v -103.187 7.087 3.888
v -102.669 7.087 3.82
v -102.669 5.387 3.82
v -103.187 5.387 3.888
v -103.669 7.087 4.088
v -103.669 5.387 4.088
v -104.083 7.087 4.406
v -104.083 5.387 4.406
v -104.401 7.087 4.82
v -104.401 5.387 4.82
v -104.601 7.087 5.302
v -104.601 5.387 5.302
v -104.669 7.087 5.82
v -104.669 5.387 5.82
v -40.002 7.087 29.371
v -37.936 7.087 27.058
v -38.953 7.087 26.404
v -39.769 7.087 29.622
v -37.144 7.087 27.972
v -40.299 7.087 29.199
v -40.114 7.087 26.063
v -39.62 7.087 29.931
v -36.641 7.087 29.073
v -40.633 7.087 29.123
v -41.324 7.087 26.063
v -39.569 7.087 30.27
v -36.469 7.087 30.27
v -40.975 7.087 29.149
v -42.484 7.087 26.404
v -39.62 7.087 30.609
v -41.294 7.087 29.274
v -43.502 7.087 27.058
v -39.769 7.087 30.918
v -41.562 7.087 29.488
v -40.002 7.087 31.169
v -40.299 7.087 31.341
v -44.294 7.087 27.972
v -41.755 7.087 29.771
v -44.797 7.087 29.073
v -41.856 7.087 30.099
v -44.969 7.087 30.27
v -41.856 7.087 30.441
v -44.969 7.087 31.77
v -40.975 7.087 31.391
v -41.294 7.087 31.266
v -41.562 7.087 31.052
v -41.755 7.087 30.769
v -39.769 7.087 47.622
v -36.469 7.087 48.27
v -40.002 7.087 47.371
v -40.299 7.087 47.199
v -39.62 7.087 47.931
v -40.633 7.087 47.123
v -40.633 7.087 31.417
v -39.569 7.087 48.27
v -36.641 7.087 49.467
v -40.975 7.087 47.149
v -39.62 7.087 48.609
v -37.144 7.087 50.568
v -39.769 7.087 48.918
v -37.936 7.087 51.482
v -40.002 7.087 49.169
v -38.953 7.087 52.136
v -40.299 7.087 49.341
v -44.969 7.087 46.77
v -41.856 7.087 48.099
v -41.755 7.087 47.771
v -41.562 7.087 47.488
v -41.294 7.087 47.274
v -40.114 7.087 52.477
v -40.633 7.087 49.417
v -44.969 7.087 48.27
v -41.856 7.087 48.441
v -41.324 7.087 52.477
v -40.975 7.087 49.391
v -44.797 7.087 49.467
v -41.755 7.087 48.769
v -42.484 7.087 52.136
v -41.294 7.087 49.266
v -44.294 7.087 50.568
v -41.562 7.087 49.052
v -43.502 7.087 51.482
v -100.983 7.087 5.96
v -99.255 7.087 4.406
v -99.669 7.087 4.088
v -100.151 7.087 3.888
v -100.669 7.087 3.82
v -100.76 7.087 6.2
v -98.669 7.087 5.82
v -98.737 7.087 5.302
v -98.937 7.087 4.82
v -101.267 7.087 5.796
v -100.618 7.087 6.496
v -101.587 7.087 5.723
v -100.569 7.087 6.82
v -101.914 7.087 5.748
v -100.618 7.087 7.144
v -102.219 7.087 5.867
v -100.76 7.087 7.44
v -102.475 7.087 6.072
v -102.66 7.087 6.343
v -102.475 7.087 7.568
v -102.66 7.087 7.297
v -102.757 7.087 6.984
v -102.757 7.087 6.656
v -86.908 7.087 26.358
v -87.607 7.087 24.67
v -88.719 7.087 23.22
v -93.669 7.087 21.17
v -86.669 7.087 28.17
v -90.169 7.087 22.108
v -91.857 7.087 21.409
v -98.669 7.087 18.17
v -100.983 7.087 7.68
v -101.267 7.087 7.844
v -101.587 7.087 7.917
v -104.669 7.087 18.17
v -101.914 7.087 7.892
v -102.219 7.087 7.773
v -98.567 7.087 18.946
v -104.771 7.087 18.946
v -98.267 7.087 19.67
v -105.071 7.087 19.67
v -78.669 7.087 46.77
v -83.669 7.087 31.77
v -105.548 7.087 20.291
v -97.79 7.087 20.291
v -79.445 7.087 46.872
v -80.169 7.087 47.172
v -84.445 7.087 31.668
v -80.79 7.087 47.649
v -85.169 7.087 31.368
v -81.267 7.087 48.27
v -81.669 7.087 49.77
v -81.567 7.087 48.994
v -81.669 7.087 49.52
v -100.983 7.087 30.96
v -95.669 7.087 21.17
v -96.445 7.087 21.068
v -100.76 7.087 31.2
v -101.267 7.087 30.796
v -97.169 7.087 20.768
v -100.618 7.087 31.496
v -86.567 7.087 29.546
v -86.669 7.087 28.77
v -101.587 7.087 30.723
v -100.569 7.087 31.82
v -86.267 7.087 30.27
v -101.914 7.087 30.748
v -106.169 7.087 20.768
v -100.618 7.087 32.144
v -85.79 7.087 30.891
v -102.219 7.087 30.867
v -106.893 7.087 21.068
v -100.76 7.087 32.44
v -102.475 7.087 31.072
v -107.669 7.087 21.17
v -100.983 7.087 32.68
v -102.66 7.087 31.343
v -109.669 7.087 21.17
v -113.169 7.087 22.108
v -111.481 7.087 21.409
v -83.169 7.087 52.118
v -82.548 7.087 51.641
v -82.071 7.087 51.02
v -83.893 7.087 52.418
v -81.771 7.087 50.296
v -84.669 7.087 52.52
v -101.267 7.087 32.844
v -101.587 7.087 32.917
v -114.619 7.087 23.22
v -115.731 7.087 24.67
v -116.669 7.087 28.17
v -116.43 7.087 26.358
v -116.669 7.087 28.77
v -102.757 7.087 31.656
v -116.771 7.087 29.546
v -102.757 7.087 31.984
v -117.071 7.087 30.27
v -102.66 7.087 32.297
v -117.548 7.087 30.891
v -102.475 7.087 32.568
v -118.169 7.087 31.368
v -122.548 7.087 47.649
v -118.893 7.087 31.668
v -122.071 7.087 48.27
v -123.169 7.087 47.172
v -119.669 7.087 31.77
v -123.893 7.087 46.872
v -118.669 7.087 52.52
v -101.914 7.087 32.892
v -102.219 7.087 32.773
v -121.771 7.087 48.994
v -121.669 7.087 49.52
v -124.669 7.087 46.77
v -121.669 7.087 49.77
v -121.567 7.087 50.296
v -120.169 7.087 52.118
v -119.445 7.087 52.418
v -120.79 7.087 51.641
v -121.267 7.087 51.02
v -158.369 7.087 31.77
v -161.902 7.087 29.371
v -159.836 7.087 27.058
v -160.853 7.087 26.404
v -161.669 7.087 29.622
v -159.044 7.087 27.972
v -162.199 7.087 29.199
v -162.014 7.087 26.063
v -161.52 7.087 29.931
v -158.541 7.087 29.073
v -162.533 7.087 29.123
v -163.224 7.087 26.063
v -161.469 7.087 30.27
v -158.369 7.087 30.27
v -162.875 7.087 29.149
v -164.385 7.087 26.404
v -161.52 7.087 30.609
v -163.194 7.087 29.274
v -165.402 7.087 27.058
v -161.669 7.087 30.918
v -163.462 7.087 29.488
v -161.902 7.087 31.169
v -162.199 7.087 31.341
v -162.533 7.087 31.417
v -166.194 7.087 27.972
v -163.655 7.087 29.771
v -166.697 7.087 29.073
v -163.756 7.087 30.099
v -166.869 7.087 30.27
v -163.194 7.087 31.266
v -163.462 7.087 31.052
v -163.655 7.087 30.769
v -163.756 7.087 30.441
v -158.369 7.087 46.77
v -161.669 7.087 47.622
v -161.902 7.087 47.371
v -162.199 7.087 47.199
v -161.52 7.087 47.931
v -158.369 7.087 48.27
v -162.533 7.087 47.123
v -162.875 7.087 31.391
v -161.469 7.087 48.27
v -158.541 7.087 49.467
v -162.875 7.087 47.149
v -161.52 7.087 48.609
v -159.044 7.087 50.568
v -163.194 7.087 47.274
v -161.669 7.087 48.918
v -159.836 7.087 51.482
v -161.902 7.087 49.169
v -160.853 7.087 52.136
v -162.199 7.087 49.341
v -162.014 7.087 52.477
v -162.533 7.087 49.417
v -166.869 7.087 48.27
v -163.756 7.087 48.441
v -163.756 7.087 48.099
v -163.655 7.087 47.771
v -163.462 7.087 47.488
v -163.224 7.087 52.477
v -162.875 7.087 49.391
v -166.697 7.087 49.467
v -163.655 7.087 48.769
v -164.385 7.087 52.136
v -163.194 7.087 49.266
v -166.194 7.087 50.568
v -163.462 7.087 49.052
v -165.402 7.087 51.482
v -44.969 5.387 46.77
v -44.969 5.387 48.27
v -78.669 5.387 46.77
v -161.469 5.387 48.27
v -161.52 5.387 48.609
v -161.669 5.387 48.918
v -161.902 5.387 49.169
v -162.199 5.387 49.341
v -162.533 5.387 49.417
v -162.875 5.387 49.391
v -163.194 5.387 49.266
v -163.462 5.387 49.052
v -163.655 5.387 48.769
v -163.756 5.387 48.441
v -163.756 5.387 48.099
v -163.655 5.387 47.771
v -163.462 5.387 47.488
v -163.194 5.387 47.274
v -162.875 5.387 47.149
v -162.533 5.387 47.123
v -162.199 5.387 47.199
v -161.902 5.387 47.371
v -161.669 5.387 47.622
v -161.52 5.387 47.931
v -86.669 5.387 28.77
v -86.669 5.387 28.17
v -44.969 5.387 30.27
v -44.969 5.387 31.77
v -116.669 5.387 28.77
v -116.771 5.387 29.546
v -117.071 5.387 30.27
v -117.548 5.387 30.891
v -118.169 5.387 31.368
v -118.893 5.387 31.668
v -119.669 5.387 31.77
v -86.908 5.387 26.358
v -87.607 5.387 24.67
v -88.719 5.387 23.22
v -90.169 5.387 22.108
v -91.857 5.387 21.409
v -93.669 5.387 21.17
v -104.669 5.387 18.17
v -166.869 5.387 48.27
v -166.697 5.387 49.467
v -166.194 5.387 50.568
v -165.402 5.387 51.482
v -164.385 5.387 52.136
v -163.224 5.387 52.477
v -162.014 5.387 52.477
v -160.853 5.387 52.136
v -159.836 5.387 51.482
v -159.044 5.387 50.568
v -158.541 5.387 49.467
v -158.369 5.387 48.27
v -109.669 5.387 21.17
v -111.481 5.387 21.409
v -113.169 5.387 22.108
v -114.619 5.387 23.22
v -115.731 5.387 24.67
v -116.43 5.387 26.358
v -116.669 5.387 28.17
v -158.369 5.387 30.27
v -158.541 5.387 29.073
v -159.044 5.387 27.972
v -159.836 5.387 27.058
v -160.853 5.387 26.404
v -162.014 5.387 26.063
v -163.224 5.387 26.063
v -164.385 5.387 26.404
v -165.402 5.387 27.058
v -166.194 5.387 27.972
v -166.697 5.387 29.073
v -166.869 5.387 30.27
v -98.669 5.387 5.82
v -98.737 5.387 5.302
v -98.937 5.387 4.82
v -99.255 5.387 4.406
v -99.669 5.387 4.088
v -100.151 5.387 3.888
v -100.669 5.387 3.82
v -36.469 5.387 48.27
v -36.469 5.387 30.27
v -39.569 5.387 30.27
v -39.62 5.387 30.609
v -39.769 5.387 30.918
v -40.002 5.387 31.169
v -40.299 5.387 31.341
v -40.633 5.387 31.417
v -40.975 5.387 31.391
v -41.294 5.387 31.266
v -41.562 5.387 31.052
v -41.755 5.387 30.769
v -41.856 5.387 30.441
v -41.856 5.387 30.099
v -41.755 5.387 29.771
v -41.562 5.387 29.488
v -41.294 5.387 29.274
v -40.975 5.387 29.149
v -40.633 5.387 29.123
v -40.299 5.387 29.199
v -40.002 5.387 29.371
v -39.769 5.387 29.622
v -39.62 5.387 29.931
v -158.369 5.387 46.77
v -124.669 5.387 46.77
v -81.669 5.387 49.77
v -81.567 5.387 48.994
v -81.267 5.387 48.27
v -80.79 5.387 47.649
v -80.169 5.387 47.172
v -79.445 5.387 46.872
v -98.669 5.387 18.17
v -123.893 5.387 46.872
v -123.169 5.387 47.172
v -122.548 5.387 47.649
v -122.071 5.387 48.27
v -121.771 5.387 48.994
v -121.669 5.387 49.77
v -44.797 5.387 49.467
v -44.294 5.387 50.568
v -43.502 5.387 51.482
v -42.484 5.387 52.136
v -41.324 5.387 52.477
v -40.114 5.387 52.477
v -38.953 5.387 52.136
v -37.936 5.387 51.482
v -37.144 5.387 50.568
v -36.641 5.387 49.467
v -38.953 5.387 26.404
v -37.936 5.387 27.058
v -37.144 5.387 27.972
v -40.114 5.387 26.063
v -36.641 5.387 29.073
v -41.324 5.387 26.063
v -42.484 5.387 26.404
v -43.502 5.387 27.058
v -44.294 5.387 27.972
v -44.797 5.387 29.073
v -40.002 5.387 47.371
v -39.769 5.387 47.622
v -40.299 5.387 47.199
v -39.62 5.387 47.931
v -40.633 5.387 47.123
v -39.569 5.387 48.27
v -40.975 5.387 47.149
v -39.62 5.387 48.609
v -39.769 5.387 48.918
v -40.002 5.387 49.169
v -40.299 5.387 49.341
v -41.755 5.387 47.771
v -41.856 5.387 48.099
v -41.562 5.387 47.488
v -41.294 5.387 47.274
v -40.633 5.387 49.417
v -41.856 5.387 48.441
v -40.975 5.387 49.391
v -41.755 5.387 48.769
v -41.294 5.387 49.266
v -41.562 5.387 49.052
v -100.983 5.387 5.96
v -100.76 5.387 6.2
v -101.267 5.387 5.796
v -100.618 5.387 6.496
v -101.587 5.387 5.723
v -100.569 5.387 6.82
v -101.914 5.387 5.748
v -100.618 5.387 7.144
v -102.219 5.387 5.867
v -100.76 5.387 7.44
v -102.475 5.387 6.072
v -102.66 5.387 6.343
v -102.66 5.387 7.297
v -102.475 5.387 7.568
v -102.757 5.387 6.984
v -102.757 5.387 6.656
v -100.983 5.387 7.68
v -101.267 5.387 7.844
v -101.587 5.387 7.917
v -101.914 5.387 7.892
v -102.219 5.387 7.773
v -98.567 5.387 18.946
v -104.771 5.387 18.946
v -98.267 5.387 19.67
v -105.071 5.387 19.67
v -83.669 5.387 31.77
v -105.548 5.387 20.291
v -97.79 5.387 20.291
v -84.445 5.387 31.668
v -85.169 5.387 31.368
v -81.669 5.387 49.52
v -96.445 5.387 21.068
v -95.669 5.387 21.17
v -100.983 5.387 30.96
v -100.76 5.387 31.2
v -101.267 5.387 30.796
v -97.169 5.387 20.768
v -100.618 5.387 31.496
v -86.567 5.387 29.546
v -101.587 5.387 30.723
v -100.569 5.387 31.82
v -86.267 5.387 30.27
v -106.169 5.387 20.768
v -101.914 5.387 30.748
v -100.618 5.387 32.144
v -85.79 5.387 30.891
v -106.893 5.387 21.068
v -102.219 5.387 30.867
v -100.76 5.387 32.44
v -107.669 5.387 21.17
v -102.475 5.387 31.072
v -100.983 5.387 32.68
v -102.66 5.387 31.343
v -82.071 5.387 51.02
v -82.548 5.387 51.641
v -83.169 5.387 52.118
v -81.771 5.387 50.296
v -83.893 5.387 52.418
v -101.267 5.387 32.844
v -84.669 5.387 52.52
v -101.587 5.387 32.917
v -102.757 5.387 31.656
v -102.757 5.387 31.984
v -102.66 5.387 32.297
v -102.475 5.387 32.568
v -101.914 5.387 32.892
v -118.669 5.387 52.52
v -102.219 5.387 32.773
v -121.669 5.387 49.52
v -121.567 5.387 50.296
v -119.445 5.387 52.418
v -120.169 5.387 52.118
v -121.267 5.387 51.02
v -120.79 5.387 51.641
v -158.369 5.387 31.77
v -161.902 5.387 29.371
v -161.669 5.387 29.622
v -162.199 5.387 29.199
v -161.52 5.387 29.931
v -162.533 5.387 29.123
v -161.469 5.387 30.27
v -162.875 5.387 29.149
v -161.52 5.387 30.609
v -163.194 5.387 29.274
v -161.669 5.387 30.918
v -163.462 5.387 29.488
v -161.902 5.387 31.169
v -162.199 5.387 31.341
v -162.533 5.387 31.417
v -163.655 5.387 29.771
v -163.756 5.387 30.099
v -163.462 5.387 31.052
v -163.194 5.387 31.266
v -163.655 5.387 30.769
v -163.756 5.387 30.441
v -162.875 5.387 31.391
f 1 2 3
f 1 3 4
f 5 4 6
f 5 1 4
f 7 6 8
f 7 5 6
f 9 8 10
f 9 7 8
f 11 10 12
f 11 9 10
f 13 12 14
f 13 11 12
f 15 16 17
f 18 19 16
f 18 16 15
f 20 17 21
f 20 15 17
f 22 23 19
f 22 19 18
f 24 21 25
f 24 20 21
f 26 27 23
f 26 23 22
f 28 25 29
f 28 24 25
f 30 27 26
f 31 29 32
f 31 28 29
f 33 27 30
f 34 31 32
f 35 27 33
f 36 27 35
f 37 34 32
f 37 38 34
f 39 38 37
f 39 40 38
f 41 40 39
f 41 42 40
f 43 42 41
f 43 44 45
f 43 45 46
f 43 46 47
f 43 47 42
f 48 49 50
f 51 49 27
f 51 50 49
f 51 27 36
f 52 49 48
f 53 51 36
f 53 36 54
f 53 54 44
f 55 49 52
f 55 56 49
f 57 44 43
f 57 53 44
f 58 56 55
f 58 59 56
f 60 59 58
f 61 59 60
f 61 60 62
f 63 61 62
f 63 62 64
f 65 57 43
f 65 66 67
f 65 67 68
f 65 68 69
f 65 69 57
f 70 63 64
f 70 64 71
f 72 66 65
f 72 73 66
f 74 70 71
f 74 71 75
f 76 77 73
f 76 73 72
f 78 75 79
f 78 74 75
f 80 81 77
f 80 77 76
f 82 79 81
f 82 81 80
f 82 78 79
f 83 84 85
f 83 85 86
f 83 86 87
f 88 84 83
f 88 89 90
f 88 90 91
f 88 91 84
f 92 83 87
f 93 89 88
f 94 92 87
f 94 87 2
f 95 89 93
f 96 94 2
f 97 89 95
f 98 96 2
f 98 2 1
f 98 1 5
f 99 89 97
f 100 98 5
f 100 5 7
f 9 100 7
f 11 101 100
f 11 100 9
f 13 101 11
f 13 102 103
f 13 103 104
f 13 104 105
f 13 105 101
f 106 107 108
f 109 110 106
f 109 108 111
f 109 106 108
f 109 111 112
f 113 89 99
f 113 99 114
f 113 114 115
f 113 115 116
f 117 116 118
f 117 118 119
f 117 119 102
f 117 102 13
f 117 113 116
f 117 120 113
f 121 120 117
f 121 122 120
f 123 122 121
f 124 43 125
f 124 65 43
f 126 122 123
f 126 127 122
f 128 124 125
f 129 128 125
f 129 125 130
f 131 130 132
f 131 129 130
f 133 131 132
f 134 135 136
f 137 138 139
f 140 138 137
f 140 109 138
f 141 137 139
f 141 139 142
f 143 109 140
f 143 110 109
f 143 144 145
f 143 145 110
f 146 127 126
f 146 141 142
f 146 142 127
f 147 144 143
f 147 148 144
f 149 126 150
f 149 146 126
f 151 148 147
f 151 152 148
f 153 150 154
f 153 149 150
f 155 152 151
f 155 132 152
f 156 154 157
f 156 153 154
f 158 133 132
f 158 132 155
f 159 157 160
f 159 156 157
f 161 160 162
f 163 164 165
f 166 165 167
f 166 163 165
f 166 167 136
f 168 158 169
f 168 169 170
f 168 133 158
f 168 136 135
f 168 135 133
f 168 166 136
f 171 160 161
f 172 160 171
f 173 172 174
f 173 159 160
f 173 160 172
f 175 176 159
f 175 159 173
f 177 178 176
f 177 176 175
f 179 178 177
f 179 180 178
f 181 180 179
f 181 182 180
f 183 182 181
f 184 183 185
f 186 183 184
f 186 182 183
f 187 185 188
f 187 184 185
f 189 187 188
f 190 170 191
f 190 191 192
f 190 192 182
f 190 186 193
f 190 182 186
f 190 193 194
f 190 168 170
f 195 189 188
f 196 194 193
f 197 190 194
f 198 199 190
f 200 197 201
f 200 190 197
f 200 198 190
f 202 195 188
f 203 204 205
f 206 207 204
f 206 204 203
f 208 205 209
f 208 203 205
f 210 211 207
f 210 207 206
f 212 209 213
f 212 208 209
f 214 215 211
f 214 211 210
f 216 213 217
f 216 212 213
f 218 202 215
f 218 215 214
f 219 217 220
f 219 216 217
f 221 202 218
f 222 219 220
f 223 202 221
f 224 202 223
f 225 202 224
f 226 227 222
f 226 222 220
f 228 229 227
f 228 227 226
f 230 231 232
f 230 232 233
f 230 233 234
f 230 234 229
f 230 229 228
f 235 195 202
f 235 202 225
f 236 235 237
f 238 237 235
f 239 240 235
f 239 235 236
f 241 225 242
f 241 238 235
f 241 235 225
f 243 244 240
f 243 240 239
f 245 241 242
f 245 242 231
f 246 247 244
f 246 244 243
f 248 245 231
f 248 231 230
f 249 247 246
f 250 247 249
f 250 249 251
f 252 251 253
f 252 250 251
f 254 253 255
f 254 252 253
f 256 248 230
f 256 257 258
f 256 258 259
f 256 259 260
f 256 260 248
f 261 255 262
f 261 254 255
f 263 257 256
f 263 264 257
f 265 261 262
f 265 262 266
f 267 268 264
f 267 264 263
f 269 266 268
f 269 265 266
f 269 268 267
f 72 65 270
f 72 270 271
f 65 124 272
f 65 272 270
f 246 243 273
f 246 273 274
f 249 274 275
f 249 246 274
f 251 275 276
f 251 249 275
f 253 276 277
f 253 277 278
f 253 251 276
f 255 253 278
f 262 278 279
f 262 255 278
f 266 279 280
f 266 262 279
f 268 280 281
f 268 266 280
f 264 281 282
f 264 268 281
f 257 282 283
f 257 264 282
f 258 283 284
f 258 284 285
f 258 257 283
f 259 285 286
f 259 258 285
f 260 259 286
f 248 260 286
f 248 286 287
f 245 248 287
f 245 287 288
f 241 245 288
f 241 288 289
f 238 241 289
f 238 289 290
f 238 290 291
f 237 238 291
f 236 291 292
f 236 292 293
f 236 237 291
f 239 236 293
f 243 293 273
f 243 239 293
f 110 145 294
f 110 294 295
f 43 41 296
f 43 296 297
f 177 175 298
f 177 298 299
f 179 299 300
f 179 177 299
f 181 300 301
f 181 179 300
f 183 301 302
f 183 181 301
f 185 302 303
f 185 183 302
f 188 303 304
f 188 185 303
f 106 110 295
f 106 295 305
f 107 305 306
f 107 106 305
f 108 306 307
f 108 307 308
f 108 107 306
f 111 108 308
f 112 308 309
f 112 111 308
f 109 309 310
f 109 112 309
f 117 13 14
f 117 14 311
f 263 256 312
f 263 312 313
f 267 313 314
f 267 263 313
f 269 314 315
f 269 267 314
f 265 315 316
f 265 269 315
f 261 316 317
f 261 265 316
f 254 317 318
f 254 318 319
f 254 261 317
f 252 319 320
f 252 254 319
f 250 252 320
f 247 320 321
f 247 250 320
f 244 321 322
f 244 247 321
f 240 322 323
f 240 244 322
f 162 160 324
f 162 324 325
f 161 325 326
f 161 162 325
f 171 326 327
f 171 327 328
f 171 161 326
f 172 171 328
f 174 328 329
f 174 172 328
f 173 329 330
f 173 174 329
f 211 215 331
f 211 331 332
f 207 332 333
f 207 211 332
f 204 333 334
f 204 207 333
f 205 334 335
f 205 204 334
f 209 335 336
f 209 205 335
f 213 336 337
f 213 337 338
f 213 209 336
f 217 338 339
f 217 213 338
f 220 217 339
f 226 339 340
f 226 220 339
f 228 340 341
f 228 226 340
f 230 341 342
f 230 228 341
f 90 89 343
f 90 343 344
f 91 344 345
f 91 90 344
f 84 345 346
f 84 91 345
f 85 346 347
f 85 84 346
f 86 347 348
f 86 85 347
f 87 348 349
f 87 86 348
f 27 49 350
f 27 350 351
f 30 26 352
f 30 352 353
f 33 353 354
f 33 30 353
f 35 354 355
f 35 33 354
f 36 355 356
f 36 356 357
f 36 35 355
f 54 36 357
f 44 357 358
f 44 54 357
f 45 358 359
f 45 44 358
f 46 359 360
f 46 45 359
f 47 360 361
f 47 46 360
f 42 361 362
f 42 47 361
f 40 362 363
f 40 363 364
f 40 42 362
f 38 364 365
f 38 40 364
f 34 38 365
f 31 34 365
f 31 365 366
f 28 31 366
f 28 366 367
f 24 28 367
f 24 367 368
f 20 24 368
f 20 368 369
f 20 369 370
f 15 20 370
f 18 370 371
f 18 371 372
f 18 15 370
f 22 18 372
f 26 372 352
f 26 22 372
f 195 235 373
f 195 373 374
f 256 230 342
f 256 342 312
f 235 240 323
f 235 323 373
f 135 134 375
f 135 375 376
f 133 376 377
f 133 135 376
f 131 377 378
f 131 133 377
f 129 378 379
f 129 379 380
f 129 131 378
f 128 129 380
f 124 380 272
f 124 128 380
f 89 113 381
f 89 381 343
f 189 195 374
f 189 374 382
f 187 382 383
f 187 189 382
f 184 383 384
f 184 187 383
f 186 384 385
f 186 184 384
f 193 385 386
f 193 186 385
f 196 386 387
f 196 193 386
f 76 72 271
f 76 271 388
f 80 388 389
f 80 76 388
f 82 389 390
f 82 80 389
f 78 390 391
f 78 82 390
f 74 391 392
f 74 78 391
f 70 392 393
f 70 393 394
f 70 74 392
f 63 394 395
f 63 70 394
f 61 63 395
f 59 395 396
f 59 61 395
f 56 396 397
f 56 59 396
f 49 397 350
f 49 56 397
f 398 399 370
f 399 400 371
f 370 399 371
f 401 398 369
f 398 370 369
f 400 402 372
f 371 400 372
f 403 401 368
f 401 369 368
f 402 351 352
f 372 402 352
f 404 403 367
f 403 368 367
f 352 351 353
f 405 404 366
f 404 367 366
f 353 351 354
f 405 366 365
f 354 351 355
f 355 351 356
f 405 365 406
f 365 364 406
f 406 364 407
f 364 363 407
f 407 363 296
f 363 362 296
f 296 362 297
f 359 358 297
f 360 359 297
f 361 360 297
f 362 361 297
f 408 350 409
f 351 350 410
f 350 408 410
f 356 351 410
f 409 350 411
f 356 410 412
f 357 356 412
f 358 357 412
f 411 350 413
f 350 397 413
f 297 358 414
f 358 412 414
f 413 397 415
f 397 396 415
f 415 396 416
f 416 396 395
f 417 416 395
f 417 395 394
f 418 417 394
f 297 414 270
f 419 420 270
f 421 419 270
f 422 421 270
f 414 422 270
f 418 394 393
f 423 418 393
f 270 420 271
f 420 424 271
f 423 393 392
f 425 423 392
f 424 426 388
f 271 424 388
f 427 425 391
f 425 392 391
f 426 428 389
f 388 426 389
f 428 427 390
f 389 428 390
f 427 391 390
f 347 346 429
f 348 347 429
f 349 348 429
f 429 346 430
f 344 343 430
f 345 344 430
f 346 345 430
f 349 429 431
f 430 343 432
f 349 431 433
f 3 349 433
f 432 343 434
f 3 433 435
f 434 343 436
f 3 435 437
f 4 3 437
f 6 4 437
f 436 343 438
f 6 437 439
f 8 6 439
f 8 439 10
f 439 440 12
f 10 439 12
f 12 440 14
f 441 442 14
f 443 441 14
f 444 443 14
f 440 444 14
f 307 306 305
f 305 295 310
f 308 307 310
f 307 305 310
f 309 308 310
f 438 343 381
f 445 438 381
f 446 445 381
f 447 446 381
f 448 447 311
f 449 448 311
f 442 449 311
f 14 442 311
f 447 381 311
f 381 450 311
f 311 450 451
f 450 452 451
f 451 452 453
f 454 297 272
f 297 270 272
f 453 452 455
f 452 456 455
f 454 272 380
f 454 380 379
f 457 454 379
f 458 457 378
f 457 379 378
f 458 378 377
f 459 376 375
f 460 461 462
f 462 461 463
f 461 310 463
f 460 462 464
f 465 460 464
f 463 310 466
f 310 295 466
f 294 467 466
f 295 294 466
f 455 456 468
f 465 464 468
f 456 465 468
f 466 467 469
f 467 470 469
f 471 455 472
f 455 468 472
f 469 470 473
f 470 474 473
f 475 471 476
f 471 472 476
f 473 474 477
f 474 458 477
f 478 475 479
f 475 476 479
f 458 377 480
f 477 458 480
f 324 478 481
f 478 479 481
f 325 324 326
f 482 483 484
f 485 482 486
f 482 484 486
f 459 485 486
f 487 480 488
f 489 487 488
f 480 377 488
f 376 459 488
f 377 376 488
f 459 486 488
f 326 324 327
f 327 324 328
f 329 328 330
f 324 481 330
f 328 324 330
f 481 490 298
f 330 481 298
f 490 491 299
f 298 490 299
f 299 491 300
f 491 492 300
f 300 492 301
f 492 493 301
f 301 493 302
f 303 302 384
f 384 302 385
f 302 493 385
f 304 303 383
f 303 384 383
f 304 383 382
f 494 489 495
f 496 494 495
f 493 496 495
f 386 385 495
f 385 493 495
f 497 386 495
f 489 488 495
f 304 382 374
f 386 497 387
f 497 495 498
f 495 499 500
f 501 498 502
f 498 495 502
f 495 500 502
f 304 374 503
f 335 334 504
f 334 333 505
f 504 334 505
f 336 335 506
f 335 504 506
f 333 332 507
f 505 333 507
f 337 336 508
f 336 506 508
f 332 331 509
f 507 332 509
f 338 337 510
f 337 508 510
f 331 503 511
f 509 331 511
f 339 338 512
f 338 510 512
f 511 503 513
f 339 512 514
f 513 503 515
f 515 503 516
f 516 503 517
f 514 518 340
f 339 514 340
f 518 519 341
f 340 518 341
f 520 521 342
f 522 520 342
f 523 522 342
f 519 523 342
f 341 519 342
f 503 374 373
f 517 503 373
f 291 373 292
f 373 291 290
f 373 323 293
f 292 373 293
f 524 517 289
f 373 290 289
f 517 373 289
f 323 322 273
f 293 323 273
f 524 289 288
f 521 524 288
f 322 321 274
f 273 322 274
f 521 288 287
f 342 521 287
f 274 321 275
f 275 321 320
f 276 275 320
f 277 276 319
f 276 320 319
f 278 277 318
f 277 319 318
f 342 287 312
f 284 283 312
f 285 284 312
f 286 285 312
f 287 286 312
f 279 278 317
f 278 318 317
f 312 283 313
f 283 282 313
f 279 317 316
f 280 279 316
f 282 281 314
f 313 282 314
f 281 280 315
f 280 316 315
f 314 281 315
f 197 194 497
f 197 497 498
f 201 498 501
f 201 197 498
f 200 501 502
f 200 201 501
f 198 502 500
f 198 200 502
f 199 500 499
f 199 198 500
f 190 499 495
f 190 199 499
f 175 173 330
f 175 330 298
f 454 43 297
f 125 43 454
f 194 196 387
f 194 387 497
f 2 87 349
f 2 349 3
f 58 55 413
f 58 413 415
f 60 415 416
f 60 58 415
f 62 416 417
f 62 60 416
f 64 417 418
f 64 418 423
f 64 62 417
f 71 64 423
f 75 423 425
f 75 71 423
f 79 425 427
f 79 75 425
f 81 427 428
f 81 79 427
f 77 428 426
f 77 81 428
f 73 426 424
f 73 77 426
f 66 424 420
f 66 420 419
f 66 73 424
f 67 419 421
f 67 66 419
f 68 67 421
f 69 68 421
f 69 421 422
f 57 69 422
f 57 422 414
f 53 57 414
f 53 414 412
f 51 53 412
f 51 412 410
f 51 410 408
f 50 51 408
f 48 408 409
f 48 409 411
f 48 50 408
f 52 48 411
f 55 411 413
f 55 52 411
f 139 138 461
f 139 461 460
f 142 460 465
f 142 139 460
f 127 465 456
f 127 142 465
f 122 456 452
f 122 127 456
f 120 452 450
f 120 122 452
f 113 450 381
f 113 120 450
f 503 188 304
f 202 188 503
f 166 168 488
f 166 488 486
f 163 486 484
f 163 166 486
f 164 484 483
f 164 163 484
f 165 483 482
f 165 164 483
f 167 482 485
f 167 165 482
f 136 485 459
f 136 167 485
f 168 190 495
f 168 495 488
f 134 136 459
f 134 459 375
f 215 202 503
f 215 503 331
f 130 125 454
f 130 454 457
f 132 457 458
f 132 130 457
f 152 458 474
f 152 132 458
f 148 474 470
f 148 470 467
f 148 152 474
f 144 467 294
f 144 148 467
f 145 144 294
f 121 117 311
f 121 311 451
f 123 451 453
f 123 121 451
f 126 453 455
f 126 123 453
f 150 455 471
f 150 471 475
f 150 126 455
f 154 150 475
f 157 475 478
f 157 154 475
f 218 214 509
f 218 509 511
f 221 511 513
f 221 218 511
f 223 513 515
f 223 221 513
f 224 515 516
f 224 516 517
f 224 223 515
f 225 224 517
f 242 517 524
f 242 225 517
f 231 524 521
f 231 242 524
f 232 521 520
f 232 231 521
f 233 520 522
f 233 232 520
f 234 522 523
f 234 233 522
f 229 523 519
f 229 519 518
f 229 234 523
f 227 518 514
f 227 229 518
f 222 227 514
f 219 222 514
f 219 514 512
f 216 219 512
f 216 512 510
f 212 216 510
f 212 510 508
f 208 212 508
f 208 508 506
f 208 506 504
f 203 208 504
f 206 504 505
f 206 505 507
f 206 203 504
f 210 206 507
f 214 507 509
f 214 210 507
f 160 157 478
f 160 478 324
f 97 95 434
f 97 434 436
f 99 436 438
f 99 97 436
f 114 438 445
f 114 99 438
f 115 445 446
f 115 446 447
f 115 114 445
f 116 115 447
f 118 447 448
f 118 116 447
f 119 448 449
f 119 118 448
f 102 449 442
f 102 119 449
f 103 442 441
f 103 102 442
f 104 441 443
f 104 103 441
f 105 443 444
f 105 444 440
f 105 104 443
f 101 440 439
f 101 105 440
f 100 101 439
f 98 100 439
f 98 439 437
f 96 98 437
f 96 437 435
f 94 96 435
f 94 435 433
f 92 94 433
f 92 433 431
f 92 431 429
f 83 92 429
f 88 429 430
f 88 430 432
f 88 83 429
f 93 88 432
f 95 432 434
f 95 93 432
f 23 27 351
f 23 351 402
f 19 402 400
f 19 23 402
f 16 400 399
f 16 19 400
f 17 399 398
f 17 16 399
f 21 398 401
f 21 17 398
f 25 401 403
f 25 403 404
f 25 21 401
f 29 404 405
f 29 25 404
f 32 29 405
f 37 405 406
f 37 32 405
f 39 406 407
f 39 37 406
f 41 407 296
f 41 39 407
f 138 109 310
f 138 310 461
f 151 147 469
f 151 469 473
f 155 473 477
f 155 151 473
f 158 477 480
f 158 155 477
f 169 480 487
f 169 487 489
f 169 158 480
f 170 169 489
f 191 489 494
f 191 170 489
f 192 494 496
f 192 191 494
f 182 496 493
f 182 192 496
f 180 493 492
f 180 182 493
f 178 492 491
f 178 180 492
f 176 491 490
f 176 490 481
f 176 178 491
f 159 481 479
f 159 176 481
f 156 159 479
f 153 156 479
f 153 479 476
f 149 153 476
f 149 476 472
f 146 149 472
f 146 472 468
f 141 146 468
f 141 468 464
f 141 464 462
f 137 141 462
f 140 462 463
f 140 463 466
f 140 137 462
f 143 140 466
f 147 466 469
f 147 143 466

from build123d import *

# Parameters (mm, degrees)
SZKIC1_R                    = 1.15
SZKIC1_R_2                  = 1.150012437
SZKIC1_R_3                  = 1.1
DODANIE_WYCI_GNI_CIE1_DEPTH = 1.7


with BuildPart() as part:
    # Szkic1 → Dodanie-wyciągnięcie1 (new body)
    with BuildSketch(Plane.XZ.offset(-7.087491716)):
        with BuildLine():
            Line((-166.869010382, 45.27), (-166.869010382, 48.27))
            ThreePointArc((-166.869010382, 48.27), (-162.619010382, 52.52), (-158.369010382, 48.27))
            Line((-158.369010382, 48.27), (-158.369010382, 46.77))
            Line((-158.369010382, 46.77), (-124.668997945, 46.77))
            ThreePointArc((-124.668997945, 46.77), (-122.547677602, 47.648679656), (-121.668997945, 49.77))
            Line((-121.668997945, 49.77), (-121.668997945, 49.52))
            ThreePointArc((-121.668997945, 49.52), (-120.790318289, 51.641320344), (-118.668997945, 52.52))
            Line((-118.668997945, 52.52), (-84.668997945, 52.52))
            ThreePointArc((-84.668997945, 52.52), (-82.547677602, 51.641320344), (-81.668997945, 49.52))
            Line((-81.668997945, 49.52), (-81.668997945, 49.77))
            ThreePointArc((-81.668997945, 49.77), (-80.790318289, 47.648679656), (-78.668997945, 46.77))
            Line((-78.668997945, 46.77), (-44.968985509, 46.77))
            Line((-44.968985509, 46.77), (-44.968985509, 48.27))
            ThreePointArc((-44.968985509, 48.27), (-40.718985509, 52.52), (-36.468985509, 48.27))
            Line((-36.468985509, 48.27), (-36.468985509, 45.27))
            Line((-36.468985509, 45.27), (-36.468985509, 33.27))
            Line((-36.468985509, 33.27), (-36.468985509, 30.27))
            ThreePointArc((-36.468985509, 30.27), (-40.718985509, 26.02), (-44.968985509, 30.27))
            Line((-44.968985509, 30.27), (-44.968985509, 31.77))
            Line((-44.968985509, 31.77), (-83.668997945, 31.77))
            ThreePointArc((-83.668997945, 31.77), (-85.790318289, 30.891320344), (-86.668997945, 28.77))
            Line((-86.668997945, 28.77), (-86.668997945, 28.17))
            ThreePointArc((-86.668997945, 28.17), (-88.719250477, 23.220252532), (-93.668997945, 21.17))
            Line((-93.668997945, 21.17), (-95.668997945, 21.17))
            ThreePointArc((-95.668997945, 21.17), (-97.790318289, 20.291320344), (-98.668997945, 18.17))
            Line((-98.668997945, 18.17), (-98.668997945, 5.82))
            ThreePointArc((-98.668997945, 5.82), (-99.254784383, 4.405786438), (-100.668997945, 3.82))
            Line((-100.668997945, 3.82), (-102.668997945, 3.82))
            ThreePointArc((-102.668997945, 3.82), (-104.083211508, 4.405786438), (-104.668997945, 5.82))
            Line((-104.668997945, 5.82), (-104.668997945, 18.17))
            ThreePointArc((-104.668997945, 18.17), (-105.547677602, 20.291320344), (-107.668997945, 21.17))
            Line((-107.668997945, 21.17), (-109.668997945, 21.17))
            ThreePointArc((-109.668997945, 21.17), (-114.618745414, 23.220252532), (-116.668997945, 28.17))
            Line((-116.668997945, 28.17), (-116.668997945, 28.77))
            ThreePointArc((-116.668997945, 28.77), (-117.547677602, 30.891320344), (-119.668997945, 31.77))
            Line((-119.668997945, 31.77), (-158.369010382, 31.77))
            Line((-158.369010382, 31.77), (-158.369010382, 30.27))
            ThreePointArc((-158.369010382, 30.27), (-162.619010382, 26.02), (-166.869010382, 30.27))
            Line((-166.869010382, 30.27), (-166.869010382, 33.27))
            Line((-166.869010382, 33.27), (-166.869010382, 45.27))
        make_face()
        with Locations((-162.618997945, 30.27)):
            Circle(SZKIC1_R, mode=Mode.SUBTRACT)
        with Locations((-162.618997945, 48.27)):
            Circle(SZKIC1_R, mode=Mode.SUBTRACT)
        with Locations((-40.718985509, 48.27)):
            Circle(SZKIC1_R_2, mode=Mode.SUBTRACT)
        with Locations((-40.718985509, 30.27)):
            Circle(SZKIC1_R_2, mode=Mode.SUBTRACT)
        with Locations((-101.668997945, 31.82)):
            Circle(SZKIC1_R_3, mode=Mode.SUBTRACT)
        with Locations((-101.668997945, 6.82)):
            Circle(SZKIC1_R_3, mode=Mode.SUBTRACT)
    extrude(amount=DODANIE_WYCI_GNI_CIE1_DEPTH)


solid = part.part
